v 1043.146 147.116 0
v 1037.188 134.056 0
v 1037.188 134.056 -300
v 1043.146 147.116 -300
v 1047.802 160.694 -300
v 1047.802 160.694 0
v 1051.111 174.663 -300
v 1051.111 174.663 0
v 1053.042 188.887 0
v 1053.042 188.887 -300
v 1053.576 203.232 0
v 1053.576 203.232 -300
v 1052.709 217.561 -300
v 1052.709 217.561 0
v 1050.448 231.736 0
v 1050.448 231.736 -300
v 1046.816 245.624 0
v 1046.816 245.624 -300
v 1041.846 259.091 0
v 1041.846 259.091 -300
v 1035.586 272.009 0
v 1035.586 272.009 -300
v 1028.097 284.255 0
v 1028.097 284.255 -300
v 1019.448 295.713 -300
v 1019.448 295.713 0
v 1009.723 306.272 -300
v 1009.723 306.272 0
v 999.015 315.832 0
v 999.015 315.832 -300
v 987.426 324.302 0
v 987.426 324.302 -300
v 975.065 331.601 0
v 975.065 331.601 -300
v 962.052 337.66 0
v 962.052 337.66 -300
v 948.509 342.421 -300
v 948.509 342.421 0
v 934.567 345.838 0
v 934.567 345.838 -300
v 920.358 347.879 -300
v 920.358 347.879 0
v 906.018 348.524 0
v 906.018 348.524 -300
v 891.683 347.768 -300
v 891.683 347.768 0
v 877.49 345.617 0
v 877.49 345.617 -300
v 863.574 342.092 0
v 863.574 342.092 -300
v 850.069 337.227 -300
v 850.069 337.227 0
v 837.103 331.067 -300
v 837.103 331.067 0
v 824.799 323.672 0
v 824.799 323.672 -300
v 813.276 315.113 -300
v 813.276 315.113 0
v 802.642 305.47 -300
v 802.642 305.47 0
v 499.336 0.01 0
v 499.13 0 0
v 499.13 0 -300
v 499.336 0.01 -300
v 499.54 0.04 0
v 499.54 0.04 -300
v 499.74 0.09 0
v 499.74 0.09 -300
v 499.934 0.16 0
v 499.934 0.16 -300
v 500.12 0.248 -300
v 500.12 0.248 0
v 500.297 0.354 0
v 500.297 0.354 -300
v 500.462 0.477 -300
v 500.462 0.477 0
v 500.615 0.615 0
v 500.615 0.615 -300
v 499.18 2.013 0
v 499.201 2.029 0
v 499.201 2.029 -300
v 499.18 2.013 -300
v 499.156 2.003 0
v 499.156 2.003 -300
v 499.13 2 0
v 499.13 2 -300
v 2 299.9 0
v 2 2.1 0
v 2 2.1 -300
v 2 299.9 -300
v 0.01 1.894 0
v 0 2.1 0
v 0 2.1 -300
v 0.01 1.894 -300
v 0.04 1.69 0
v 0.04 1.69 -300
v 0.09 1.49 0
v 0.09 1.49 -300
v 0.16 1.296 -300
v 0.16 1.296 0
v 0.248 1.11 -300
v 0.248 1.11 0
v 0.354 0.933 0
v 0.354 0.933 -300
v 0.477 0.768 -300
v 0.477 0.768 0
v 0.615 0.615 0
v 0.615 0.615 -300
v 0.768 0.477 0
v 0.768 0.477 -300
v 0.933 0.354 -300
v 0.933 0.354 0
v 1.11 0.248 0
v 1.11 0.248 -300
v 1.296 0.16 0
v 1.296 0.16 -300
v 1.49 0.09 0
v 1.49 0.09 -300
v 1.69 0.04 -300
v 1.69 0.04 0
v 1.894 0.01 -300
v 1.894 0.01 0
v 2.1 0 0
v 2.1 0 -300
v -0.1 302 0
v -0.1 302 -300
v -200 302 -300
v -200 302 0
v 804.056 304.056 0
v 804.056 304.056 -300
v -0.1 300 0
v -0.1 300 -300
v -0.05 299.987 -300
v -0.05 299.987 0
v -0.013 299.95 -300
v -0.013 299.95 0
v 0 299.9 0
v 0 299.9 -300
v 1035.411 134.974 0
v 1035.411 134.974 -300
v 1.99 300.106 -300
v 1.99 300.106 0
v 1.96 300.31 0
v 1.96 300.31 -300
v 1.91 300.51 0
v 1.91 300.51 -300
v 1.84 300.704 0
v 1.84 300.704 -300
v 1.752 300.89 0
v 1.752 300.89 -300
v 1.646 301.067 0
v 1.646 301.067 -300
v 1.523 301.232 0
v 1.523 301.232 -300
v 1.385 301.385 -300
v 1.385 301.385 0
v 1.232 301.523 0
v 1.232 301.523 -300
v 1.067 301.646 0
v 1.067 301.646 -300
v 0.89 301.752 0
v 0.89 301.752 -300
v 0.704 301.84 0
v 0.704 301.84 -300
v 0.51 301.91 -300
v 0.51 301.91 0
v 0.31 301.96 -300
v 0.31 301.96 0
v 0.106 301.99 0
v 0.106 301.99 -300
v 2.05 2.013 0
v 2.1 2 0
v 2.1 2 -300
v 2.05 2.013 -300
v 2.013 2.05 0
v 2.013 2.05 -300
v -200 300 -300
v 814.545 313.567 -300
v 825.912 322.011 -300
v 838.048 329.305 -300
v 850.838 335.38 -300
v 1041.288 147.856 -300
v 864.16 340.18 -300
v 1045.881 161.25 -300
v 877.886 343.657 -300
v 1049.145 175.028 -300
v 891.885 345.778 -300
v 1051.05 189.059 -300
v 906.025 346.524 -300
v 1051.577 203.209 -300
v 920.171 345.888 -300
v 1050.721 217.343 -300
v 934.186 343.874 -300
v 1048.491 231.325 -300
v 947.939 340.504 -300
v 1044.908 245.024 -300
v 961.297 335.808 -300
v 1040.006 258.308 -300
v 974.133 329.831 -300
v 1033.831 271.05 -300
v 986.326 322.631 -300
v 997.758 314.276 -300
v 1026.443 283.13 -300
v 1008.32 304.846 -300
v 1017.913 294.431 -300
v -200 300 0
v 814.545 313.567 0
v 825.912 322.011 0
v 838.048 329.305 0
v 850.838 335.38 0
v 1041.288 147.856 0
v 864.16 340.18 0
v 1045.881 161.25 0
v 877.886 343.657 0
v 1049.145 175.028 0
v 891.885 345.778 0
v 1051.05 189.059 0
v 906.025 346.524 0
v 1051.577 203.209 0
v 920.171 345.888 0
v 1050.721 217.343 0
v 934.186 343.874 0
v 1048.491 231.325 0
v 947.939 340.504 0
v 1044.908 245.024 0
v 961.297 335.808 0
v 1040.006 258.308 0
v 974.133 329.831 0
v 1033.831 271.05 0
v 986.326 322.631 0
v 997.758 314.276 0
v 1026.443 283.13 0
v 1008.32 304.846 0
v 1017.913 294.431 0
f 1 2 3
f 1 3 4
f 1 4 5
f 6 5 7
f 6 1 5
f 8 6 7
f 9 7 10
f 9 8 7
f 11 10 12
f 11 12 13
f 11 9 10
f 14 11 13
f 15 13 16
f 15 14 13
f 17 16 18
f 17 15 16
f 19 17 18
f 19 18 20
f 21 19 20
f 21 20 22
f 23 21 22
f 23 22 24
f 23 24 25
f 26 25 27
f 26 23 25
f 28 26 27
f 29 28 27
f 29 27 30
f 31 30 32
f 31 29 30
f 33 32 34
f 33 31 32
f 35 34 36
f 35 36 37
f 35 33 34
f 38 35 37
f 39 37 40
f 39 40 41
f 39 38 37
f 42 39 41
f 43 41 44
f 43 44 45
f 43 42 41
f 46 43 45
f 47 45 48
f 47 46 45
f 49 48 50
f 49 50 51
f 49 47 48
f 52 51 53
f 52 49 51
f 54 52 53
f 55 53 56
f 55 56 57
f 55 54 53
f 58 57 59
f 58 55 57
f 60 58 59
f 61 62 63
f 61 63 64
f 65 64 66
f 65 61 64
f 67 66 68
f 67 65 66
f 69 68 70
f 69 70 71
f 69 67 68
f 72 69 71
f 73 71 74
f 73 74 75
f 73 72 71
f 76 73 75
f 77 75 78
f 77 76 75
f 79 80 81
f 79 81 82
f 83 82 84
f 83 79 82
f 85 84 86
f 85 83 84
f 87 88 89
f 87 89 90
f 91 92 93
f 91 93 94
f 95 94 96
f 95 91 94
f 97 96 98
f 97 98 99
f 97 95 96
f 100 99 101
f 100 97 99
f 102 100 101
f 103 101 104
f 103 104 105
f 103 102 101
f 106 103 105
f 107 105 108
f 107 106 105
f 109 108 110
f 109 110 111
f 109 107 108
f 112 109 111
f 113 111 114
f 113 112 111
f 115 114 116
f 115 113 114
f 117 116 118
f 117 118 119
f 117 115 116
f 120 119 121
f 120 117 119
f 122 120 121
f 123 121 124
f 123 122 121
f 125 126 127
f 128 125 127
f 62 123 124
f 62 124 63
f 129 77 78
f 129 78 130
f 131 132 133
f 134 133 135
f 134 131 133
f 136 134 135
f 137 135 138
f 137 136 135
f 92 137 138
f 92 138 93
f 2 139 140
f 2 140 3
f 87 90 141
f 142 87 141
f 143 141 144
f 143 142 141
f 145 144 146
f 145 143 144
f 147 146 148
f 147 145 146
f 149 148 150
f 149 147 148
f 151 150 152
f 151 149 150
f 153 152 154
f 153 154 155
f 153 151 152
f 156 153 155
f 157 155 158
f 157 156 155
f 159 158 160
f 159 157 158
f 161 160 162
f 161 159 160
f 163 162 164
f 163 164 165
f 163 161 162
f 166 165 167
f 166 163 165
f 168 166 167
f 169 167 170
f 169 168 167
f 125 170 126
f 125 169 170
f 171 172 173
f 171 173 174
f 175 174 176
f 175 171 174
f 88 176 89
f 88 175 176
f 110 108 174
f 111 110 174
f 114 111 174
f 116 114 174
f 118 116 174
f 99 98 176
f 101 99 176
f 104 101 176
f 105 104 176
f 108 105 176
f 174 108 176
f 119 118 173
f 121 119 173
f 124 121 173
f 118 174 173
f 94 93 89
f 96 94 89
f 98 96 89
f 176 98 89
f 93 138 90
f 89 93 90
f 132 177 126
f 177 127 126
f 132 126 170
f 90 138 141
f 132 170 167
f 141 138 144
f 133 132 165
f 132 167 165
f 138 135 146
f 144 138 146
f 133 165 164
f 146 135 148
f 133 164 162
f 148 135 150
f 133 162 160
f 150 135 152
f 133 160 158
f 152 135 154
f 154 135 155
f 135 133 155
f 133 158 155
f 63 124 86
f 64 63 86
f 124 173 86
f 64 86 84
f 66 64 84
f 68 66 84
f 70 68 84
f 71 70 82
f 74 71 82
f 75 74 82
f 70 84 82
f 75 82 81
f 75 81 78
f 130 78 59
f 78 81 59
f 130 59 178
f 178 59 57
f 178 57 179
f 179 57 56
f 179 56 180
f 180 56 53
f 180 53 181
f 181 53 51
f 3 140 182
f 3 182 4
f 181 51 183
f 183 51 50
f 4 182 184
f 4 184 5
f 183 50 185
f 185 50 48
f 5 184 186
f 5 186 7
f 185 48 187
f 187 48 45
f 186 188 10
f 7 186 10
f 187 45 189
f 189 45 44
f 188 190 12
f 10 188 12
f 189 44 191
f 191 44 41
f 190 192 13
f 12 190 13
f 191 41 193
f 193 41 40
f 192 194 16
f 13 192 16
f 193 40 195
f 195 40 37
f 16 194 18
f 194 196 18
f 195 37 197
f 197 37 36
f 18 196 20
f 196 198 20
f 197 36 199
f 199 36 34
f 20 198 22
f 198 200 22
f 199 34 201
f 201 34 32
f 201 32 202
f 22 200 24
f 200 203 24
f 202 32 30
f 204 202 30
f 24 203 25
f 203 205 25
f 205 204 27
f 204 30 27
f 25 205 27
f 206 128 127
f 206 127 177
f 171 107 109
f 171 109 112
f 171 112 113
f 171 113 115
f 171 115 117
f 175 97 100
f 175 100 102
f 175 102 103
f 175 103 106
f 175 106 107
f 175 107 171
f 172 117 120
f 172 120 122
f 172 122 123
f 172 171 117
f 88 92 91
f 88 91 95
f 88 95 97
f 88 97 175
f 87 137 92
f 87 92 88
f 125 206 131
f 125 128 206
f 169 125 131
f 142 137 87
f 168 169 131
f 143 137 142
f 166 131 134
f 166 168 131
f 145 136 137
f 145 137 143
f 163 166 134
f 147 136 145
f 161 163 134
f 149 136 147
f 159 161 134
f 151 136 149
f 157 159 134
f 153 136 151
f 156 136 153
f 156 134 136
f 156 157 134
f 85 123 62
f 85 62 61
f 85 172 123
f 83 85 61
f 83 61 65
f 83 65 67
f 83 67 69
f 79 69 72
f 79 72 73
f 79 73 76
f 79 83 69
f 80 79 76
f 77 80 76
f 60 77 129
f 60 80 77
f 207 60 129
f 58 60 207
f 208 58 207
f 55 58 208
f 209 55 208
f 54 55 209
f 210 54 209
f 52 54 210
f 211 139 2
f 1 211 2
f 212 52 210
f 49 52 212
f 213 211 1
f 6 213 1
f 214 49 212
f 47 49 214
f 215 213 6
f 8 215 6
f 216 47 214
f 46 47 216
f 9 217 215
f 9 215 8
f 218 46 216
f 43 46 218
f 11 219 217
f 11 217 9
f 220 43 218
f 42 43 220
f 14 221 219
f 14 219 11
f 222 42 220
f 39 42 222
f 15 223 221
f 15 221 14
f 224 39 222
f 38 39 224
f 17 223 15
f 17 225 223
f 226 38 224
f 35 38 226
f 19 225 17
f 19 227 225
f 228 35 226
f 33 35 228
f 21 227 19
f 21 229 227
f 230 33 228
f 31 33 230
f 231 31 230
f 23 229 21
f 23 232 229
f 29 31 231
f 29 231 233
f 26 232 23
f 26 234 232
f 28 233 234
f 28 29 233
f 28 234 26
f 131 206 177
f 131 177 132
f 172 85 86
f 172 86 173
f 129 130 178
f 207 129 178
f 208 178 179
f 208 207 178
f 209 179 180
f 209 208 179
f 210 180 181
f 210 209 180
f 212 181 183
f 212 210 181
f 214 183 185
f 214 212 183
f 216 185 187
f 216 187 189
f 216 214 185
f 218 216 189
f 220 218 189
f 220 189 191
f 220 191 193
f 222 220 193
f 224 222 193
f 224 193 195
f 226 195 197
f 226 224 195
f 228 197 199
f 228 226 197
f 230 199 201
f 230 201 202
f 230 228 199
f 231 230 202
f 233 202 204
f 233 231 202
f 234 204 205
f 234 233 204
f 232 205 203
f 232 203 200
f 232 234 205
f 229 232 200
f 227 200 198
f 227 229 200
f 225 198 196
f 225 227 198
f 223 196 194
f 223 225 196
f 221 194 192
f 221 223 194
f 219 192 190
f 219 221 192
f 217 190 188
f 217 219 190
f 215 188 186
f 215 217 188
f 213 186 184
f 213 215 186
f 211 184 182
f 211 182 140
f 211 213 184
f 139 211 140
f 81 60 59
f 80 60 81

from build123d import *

# Parameters (mm, degrees)
SM_BASE_FLANGE_1_DEPTH = 300


# Sheet-metal steps are written as plain solids
with BuildPart() as part:
    # Sketch 1 → 基体-法兰1 (new body)
    with BuildSketch(Plane.XY):
        with BuildLine():
            Line((-200, 300), (-0.1, 300))
            ThreePointArc((-0.1, 300), (-0.029289322, 299.970710678), (0, 299.9))
            Line((0, 299.9), (0, 2.1))
            ThreePointArc((0, 2.1), (0.61507576, 0.61507576), (2.1, 0))
            Line((2.1, 0), (499.130151519, 0))
            ThreePointArc((499.130151519, 0), (499.933786727, 0.159852982), (500.61507576, 0.61507576))
            Line((500.61507576, 0.61507576), (804.05591591, 304.05591591))
            ThreePointArc((804.05591591, 304.05591591), (992.143758514, 318.593525064), (1035.4112588, 134.973531505))
            Line((1035.4112588, 134.973531505), (1037.188153416, 134.055574248))
            ThreePointArc((1037.188153416, 134.055574248), (993.323860022, 320.208257373), (802.641702348, 305.470129473))
            Line((802.641702348, 305.470129473), (499.200862197, 2.029289322))
            ThreePointArc((499.200862197, 2.029289322), (499.168419862, 2.007612047), (499.130151519, 2))
            Line((499.130151519, 2), (2.1, 2))
            ThreePointArc((2.1, 2), (2.029289322, 2.029289322), (2, 2.1))
            Line((2, 2.1), (2, 299.9))
            ThreePointArc((2, 299.9), (1.38492424, 301.384924241), (-0.100000001, 302))
            Line((-0.1, 302), (-200, 302))
            Line((-200, 302), (-200, 300))
        make_face()
    extrude(amount=-SM_BASE_FLANGE_1_DEPTH)


solid = part.part
